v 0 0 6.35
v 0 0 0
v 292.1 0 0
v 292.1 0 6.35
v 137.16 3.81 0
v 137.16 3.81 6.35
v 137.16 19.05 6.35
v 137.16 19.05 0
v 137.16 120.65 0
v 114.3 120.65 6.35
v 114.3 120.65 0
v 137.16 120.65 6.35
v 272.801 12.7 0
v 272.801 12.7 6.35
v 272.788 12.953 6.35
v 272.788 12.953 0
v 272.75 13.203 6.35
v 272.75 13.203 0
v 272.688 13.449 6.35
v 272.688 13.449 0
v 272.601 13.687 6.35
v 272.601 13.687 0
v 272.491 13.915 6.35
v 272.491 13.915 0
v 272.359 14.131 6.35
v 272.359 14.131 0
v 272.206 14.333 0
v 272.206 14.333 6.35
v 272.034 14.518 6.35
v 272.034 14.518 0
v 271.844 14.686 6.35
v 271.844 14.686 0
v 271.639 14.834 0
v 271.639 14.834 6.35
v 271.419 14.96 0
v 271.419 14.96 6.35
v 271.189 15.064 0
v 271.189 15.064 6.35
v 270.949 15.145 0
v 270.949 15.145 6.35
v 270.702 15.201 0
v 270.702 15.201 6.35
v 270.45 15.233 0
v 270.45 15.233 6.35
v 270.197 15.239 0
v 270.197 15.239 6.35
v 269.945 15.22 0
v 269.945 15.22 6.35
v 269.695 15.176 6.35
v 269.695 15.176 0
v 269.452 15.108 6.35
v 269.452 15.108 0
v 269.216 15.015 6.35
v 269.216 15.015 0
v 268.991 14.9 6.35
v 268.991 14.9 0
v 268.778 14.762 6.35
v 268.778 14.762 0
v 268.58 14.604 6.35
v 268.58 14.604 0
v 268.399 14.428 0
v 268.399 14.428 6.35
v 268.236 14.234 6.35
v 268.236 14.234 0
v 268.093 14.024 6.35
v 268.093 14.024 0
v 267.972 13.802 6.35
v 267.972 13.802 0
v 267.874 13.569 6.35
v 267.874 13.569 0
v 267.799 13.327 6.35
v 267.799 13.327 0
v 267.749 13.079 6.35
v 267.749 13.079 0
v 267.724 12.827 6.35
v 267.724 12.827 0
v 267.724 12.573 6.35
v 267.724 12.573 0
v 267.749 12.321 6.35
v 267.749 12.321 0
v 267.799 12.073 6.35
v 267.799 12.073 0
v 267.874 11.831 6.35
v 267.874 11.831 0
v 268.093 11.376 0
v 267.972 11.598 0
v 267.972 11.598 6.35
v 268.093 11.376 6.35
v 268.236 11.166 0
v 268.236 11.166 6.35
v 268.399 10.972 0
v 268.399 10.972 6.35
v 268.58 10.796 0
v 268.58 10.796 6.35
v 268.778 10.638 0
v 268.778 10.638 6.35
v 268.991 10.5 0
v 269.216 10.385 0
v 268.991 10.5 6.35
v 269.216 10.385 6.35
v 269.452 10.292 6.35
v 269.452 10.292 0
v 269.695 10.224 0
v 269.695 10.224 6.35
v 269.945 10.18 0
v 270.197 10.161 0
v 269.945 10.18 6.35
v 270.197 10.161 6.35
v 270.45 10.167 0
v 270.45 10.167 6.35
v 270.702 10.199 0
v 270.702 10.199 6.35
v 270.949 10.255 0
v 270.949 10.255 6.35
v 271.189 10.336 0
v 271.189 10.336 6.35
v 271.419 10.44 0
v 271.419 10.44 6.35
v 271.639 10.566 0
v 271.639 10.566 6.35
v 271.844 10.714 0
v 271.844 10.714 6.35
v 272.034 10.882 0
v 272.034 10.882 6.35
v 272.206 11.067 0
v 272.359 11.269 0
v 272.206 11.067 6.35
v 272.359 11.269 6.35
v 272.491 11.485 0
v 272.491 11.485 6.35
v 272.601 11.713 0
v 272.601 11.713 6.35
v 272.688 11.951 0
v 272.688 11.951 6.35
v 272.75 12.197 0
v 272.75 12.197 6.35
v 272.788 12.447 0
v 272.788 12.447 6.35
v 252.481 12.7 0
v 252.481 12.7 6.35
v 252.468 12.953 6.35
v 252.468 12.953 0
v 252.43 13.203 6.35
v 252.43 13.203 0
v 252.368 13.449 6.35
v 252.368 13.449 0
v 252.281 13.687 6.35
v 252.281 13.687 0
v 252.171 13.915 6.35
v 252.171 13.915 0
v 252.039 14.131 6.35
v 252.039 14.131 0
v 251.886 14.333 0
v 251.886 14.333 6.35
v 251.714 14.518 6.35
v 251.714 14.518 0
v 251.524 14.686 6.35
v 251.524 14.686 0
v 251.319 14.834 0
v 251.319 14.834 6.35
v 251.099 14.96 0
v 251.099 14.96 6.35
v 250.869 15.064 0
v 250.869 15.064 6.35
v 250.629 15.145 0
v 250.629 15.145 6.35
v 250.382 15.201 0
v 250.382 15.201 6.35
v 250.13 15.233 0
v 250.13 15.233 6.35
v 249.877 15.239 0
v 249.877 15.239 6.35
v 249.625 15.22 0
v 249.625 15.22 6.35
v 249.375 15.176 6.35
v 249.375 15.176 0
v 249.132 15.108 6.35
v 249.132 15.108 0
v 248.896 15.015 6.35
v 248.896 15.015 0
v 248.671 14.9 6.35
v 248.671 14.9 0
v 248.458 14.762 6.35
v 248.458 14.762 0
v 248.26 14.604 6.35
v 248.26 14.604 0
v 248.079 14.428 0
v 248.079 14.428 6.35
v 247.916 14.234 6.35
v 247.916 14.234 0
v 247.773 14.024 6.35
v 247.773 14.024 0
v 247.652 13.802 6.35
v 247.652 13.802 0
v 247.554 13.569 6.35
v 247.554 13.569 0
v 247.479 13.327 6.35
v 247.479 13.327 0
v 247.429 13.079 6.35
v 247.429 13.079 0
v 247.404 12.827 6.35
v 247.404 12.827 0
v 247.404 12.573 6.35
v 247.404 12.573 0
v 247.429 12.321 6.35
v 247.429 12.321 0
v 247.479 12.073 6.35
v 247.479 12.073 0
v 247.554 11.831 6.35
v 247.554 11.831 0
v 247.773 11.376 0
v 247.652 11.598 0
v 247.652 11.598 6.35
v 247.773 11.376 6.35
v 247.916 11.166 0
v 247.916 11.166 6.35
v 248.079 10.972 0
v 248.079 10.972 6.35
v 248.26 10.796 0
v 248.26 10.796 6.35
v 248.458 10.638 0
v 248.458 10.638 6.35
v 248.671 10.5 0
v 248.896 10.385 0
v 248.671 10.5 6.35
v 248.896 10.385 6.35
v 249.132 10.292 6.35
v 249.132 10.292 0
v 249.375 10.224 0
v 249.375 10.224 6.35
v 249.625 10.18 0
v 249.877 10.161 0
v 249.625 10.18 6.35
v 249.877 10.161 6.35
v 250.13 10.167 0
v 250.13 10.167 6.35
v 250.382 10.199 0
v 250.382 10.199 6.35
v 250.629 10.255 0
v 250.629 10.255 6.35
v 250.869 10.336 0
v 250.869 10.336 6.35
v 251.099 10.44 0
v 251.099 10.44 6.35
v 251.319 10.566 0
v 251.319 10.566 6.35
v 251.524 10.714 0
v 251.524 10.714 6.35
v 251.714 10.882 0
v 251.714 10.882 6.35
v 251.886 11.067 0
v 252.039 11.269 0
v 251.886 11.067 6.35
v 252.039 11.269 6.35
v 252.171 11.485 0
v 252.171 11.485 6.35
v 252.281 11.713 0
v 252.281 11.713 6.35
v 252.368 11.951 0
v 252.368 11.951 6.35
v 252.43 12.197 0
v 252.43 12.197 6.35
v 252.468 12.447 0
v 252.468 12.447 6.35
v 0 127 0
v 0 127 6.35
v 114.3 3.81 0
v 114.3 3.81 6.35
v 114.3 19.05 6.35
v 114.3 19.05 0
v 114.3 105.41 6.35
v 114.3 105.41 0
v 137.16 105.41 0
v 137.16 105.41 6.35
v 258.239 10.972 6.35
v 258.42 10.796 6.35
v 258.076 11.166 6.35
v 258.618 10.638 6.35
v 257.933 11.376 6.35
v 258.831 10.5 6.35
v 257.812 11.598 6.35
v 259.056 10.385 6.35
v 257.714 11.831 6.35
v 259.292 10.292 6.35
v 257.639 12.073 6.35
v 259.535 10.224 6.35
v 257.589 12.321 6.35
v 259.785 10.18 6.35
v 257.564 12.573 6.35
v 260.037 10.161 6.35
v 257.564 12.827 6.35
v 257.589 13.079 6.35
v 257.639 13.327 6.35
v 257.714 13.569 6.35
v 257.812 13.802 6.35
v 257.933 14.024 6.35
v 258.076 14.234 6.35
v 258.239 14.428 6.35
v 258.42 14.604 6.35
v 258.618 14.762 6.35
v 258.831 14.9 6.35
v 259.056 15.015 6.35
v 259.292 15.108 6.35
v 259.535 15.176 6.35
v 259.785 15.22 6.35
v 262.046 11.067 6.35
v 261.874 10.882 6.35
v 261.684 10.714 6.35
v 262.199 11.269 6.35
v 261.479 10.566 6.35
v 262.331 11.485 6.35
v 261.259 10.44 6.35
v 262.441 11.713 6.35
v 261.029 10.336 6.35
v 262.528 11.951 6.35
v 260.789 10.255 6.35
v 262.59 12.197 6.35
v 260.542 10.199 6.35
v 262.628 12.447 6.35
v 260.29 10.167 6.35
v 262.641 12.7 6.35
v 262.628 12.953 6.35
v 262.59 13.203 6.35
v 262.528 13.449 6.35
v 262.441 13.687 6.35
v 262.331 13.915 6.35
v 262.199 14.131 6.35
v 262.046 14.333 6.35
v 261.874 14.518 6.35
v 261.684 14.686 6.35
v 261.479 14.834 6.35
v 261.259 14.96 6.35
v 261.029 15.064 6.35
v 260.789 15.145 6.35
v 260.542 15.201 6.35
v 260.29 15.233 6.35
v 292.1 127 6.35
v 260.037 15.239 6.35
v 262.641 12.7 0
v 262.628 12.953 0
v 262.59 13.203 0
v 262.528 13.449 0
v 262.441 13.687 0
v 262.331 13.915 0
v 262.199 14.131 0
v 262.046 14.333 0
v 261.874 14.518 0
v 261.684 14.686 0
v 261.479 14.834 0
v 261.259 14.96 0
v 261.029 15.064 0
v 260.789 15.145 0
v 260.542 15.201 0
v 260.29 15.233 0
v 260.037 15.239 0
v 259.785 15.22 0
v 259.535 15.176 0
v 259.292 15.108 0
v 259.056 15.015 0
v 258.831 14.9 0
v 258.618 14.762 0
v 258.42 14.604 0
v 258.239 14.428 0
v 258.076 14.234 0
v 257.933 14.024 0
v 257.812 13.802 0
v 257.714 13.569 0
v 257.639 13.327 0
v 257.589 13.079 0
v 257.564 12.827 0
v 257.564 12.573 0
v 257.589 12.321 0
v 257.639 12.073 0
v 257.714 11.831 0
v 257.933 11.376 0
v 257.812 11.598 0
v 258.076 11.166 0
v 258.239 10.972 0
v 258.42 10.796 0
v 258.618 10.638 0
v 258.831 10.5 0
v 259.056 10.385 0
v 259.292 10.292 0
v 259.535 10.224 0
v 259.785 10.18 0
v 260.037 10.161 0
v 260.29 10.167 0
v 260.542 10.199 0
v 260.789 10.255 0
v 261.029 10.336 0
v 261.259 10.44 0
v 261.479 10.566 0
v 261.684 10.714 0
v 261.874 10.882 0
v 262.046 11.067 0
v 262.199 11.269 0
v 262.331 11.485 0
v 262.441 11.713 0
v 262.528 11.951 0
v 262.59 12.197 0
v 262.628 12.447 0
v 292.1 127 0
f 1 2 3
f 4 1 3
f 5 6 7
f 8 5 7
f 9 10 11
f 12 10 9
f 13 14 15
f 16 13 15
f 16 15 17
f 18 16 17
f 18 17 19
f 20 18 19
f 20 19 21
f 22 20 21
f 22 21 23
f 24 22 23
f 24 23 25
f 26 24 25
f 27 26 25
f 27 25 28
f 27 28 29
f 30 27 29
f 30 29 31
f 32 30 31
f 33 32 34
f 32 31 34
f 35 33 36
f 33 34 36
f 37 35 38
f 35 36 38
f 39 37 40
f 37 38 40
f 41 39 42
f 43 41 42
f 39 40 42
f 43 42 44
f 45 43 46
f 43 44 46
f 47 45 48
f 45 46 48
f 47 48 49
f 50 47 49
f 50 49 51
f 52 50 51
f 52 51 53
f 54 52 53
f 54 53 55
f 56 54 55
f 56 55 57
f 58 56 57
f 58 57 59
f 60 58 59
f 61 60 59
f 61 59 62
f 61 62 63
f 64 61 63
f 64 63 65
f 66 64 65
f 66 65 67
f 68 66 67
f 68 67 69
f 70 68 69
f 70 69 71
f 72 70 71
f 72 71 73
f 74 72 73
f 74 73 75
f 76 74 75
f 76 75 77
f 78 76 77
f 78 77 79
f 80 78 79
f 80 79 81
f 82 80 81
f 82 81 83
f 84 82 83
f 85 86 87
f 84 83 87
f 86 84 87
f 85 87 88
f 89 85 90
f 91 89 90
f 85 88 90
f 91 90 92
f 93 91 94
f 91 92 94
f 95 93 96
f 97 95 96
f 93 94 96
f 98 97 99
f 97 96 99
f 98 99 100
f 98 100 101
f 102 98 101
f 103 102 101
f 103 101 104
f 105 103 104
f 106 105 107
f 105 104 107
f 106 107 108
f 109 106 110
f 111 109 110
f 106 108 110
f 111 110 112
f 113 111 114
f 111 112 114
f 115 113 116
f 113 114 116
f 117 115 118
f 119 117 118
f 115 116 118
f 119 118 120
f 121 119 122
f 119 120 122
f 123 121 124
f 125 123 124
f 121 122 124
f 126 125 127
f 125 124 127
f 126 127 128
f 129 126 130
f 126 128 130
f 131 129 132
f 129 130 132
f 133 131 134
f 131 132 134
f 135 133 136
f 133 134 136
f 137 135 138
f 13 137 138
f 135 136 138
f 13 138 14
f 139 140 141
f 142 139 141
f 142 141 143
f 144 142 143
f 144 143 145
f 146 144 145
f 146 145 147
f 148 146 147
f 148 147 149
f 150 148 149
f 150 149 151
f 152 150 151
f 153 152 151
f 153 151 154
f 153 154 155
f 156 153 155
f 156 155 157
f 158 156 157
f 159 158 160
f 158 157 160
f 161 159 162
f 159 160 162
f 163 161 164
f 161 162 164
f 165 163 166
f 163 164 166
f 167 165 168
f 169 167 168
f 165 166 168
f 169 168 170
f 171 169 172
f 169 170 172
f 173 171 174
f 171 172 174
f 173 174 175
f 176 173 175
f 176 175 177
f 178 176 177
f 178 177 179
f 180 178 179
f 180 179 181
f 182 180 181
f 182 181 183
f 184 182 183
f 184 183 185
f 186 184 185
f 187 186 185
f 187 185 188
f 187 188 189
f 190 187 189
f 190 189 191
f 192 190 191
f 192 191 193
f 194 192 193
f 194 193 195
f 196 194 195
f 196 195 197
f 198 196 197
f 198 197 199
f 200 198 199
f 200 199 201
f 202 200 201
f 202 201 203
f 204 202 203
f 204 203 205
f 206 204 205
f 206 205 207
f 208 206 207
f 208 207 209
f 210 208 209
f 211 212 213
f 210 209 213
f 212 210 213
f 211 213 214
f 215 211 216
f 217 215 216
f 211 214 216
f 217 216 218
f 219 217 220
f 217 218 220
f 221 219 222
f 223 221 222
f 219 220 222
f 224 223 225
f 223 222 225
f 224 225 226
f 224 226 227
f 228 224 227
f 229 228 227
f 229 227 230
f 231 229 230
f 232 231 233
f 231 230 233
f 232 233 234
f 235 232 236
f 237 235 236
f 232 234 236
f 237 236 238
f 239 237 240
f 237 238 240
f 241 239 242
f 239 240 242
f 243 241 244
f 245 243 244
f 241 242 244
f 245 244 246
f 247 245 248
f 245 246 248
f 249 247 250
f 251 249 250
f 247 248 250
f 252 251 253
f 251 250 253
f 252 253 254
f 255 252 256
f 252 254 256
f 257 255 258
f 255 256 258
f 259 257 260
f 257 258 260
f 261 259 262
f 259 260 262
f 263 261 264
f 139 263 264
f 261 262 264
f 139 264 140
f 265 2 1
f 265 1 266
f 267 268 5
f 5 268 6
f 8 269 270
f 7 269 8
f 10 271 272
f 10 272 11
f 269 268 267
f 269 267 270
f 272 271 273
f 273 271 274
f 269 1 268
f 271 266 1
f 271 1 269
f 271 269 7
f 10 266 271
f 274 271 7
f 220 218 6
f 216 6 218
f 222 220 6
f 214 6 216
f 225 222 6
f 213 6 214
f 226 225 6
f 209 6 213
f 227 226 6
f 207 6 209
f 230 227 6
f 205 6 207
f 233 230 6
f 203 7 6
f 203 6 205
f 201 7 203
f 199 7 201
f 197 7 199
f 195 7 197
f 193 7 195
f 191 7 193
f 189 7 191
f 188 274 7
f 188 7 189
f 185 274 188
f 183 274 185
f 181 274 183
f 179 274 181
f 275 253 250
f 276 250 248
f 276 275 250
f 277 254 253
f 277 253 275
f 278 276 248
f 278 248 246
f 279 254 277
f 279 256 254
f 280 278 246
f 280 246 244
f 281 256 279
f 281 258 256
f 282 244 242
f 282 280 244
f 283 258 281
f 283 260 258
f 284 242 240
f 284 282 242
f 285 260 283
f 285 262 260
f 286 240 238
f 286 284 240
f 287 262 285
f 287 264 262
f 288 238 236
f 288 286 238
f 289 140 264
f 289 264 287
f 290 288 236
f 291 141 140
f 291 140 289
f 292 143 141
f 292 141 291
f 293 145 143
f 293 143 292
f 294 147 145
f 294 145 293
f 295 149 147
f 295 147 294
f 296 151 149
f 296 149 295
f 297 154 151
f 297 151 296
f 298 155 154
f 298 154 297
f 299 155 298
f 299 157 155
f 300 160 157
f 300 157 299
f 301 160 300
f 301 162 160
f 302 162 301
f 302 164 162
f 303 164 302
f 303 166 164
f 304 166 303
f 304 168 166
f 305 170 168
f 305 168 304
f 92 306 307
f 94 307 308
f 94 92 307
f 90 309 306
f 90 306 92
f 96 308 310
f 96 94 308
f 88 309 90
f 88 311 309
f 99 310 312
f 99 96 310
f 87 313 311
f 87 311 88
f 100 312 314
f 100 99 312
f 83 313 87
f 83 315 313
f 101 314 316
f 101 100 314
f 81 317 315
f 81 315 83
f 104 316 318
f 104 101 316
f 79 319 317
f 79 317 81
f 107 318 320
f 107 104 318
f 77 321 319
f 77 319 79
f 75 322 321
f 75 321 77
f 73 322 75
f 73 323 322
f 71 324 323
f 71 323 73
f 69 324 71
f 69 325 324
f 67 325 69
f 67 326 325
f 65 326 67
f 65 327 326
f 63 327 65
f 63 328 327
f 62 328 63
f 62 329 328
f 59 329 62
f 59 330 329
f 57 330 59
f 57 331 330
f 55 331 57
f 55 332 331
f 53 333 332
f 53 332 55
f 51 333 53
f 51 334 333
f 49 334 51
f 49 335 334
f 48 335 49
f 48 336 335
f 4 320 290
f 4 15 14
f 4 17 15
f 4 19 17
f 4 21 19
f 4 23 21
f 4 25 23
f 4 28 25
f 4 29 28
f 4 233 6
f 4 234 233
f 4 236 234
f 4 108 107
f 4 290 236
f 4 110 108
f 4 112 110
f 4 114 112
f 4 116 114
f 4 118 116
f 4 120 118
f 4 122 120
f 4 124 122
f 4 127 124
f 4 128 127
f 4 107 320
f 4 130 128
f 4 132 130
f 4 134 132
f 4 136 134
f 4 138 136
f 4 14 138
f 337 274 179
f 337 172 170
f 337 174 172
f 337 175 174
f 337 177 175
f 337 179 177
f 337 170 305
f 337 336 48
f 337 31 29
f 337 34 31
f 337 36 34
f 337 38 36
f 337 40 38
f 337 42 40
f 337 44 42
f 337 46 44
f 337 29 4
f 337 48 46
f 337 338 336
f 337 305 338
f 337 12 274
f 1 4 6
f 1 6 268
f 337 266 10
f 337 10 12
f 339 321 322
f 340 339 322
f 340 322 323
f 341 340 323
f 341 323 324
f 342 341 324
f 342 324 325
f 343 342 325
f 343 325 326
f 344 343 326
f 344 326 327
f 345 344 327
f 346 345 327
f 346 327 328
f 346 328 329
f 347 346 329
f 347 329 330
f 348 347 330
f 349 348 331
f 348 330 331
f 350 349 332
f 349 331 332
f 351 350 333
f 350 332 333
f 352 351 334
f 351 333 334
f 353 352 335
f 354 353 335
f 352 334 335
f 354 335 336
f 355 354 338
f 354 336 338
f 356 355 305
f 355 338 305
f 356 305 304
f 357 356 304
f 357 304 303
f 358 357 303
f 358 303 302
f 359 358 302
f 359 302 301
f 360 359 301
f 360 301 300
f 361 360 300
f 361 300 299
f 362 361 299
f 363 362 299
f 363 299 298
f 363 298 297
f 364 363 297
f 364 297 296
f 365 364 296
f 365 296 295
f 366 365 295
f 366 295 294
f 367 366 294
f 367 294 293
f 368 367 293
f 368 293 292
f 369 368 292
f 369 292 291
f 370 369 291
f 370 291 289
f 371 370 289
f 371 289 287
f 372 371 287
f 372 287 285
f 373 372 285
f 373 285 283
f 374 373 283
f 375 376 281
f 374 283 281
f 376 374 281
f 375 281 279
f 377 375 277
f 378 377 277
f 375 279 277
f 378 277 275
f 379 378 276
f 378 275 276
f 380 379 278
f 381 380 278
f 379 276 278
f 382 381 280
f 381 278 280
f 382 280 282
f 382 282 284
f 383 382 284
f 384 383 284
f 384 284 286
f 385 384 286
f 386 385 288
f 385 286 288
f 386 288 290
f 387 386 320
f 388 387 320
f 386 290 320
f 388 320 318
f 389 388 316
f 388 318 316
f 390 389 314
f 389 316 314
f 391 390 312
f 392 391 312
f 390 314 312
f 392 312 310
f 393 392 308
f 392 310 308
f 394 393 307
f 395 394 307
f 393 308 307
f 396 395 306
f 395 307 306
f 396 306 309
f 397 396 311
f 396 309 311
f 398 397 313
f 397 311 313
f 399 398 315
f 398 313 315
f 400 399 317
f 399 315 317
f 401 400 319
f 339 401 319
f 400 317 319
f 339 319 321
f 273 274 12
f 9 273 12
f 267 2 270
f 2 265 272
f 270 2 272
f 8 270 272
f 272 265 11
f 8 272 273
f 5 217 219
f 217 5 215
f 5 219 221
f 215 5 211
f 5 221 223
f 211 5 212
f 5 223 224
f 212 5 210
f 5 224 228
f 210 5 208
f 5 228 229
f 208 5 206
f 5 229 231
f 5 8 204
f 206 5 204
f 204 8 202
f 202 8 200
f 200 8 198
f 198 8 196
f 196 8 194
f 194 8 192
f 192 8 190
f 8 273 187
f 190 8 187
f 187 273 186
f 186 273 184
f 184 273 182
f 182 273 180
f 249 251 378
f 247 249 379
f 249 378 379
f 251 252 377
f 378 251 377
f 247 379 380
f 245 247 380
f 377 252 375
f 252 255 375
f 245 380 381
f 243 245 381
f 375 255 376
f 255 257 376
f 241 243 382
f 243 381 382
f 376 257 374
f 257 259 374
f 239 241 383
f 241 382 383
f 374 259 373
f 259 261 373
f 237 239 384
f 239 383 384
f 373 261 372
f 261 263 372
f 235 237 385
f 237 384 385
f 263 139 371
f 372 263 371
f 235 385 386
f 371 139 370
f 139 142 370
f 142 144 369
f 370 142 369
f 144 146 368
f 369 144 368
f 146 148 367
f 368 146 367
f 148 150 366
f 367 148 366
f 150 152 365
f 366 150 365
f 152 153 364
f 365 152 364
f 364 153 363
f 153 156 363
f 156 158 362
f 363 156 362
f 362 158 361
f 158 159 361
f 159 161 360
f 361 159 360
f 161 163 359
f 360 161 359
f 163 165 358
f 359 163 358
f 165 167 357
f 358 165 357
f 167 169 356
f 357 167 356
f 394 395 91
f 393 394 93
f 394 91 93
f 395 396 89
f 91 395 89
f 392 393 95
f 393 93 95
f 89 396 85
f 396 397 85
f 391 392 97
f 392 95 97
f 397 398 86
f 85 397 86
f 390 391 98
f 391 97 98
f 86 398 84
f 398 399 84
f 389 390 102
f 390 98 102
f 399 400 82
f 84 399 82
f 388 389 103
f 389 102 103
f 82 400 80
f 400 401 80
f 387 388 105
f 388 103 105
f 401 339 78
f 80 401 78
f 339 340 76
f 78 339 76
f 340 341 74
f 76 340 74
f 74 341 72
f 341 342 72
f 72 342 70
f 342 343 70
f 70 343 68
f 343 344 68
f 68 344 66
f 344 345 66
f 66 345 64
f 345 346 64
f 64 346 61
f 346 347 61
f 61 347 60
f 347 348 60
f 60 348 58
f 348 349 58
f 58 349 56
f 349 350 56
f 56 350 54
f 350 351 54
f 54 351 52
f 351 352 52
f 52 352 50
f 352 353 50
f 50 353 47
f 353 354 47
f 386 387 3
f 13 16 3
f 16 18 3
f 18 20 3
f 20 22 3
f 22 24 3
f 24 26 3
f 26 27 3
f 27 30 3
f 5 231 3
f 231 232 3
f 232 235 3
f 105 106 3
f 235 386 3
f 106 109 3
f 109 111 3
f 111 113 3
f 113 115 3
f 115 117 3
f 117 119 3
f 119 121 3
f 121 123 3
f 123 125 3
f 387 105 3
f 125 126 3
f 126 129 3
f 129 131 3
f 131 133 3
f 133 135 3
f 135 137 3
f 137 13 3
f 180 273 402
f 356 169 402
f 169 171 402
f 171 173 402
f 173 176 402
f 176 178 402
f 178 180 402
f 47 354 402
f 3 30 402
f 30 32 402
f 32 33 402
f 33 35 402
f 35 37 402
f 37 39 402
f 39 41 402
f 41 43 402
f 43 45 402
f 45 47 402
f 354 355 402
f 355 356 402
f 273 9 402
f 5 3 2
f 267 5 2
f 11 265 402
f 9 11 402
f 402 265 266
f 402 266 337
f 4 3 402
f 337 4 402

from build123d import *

# Parameters (mm, degrees)
SKETCH1_W           = 292.1
SKETCH1_H           = 127
BOSS_EXTRUDE1_DEPTH = 6.35
SKETCH2_W           = 22.86
SKETCH2_H           = 15.24
CUT_EXTRUDE1_DEPTH  = 6.35
LPATTERN1_COUNT     = 2
LPATTERN1_PITCH     = 101.6
SKETCH3_R           = 2.54
CUT_EXTRUDE2_DEPTH  = 7.35


with BuildPart() as part:
    # Sketch1 → Boss-Extrude1 (new body)
    with BuildSketch(Plane.XY):
        with Locations((146.05, 63.5)):
            Rectangle(SKETCH1_W, SKETCH1_H)
    extrude(amount=BOSS_EXTRUDE1_DEPTH)

    # Sketch2 → Cut-Extrude1 (cut)
    with BuildSketch(Plane.XY.offset(6.35)):
        with Locations((125.73, 11.43)):
            Rectangle(SKETCH2_W, SKETCH2_H)
    cut_extrude1 = extrude(amount=-CUT_EXTRUDE1_DEPTH, mode=Mode.SUBTRACT)

    # LPattern1: Cut-Extrude1 ×2
    with Locations(*[(0, i * LPATTERN1_PITCH, 0) for i in range(1, LPATTERN1_COUNT)]):
        add(cut_extrude1, mode=Mode.SUBTRACT)

    # Sketch3 → Cut-Extrude2 (cut, through all)
    with BuildSketch(Plane.XY.offset(6.35)):
        with Locations((249.94060771, 12.7)):
            Circle(SKETCH3_R)
        with Locations((260.10060771, 12.7)):
            Circle(SKETCH3_R)
        with Locations((270.26060771, 12.7)):
            Circle(SKETCH3_R)
    extrude(amount=-CUT_EXTRUDE2_DEPTH, mode=Mode.SUBTRACT)


solid = part.part
